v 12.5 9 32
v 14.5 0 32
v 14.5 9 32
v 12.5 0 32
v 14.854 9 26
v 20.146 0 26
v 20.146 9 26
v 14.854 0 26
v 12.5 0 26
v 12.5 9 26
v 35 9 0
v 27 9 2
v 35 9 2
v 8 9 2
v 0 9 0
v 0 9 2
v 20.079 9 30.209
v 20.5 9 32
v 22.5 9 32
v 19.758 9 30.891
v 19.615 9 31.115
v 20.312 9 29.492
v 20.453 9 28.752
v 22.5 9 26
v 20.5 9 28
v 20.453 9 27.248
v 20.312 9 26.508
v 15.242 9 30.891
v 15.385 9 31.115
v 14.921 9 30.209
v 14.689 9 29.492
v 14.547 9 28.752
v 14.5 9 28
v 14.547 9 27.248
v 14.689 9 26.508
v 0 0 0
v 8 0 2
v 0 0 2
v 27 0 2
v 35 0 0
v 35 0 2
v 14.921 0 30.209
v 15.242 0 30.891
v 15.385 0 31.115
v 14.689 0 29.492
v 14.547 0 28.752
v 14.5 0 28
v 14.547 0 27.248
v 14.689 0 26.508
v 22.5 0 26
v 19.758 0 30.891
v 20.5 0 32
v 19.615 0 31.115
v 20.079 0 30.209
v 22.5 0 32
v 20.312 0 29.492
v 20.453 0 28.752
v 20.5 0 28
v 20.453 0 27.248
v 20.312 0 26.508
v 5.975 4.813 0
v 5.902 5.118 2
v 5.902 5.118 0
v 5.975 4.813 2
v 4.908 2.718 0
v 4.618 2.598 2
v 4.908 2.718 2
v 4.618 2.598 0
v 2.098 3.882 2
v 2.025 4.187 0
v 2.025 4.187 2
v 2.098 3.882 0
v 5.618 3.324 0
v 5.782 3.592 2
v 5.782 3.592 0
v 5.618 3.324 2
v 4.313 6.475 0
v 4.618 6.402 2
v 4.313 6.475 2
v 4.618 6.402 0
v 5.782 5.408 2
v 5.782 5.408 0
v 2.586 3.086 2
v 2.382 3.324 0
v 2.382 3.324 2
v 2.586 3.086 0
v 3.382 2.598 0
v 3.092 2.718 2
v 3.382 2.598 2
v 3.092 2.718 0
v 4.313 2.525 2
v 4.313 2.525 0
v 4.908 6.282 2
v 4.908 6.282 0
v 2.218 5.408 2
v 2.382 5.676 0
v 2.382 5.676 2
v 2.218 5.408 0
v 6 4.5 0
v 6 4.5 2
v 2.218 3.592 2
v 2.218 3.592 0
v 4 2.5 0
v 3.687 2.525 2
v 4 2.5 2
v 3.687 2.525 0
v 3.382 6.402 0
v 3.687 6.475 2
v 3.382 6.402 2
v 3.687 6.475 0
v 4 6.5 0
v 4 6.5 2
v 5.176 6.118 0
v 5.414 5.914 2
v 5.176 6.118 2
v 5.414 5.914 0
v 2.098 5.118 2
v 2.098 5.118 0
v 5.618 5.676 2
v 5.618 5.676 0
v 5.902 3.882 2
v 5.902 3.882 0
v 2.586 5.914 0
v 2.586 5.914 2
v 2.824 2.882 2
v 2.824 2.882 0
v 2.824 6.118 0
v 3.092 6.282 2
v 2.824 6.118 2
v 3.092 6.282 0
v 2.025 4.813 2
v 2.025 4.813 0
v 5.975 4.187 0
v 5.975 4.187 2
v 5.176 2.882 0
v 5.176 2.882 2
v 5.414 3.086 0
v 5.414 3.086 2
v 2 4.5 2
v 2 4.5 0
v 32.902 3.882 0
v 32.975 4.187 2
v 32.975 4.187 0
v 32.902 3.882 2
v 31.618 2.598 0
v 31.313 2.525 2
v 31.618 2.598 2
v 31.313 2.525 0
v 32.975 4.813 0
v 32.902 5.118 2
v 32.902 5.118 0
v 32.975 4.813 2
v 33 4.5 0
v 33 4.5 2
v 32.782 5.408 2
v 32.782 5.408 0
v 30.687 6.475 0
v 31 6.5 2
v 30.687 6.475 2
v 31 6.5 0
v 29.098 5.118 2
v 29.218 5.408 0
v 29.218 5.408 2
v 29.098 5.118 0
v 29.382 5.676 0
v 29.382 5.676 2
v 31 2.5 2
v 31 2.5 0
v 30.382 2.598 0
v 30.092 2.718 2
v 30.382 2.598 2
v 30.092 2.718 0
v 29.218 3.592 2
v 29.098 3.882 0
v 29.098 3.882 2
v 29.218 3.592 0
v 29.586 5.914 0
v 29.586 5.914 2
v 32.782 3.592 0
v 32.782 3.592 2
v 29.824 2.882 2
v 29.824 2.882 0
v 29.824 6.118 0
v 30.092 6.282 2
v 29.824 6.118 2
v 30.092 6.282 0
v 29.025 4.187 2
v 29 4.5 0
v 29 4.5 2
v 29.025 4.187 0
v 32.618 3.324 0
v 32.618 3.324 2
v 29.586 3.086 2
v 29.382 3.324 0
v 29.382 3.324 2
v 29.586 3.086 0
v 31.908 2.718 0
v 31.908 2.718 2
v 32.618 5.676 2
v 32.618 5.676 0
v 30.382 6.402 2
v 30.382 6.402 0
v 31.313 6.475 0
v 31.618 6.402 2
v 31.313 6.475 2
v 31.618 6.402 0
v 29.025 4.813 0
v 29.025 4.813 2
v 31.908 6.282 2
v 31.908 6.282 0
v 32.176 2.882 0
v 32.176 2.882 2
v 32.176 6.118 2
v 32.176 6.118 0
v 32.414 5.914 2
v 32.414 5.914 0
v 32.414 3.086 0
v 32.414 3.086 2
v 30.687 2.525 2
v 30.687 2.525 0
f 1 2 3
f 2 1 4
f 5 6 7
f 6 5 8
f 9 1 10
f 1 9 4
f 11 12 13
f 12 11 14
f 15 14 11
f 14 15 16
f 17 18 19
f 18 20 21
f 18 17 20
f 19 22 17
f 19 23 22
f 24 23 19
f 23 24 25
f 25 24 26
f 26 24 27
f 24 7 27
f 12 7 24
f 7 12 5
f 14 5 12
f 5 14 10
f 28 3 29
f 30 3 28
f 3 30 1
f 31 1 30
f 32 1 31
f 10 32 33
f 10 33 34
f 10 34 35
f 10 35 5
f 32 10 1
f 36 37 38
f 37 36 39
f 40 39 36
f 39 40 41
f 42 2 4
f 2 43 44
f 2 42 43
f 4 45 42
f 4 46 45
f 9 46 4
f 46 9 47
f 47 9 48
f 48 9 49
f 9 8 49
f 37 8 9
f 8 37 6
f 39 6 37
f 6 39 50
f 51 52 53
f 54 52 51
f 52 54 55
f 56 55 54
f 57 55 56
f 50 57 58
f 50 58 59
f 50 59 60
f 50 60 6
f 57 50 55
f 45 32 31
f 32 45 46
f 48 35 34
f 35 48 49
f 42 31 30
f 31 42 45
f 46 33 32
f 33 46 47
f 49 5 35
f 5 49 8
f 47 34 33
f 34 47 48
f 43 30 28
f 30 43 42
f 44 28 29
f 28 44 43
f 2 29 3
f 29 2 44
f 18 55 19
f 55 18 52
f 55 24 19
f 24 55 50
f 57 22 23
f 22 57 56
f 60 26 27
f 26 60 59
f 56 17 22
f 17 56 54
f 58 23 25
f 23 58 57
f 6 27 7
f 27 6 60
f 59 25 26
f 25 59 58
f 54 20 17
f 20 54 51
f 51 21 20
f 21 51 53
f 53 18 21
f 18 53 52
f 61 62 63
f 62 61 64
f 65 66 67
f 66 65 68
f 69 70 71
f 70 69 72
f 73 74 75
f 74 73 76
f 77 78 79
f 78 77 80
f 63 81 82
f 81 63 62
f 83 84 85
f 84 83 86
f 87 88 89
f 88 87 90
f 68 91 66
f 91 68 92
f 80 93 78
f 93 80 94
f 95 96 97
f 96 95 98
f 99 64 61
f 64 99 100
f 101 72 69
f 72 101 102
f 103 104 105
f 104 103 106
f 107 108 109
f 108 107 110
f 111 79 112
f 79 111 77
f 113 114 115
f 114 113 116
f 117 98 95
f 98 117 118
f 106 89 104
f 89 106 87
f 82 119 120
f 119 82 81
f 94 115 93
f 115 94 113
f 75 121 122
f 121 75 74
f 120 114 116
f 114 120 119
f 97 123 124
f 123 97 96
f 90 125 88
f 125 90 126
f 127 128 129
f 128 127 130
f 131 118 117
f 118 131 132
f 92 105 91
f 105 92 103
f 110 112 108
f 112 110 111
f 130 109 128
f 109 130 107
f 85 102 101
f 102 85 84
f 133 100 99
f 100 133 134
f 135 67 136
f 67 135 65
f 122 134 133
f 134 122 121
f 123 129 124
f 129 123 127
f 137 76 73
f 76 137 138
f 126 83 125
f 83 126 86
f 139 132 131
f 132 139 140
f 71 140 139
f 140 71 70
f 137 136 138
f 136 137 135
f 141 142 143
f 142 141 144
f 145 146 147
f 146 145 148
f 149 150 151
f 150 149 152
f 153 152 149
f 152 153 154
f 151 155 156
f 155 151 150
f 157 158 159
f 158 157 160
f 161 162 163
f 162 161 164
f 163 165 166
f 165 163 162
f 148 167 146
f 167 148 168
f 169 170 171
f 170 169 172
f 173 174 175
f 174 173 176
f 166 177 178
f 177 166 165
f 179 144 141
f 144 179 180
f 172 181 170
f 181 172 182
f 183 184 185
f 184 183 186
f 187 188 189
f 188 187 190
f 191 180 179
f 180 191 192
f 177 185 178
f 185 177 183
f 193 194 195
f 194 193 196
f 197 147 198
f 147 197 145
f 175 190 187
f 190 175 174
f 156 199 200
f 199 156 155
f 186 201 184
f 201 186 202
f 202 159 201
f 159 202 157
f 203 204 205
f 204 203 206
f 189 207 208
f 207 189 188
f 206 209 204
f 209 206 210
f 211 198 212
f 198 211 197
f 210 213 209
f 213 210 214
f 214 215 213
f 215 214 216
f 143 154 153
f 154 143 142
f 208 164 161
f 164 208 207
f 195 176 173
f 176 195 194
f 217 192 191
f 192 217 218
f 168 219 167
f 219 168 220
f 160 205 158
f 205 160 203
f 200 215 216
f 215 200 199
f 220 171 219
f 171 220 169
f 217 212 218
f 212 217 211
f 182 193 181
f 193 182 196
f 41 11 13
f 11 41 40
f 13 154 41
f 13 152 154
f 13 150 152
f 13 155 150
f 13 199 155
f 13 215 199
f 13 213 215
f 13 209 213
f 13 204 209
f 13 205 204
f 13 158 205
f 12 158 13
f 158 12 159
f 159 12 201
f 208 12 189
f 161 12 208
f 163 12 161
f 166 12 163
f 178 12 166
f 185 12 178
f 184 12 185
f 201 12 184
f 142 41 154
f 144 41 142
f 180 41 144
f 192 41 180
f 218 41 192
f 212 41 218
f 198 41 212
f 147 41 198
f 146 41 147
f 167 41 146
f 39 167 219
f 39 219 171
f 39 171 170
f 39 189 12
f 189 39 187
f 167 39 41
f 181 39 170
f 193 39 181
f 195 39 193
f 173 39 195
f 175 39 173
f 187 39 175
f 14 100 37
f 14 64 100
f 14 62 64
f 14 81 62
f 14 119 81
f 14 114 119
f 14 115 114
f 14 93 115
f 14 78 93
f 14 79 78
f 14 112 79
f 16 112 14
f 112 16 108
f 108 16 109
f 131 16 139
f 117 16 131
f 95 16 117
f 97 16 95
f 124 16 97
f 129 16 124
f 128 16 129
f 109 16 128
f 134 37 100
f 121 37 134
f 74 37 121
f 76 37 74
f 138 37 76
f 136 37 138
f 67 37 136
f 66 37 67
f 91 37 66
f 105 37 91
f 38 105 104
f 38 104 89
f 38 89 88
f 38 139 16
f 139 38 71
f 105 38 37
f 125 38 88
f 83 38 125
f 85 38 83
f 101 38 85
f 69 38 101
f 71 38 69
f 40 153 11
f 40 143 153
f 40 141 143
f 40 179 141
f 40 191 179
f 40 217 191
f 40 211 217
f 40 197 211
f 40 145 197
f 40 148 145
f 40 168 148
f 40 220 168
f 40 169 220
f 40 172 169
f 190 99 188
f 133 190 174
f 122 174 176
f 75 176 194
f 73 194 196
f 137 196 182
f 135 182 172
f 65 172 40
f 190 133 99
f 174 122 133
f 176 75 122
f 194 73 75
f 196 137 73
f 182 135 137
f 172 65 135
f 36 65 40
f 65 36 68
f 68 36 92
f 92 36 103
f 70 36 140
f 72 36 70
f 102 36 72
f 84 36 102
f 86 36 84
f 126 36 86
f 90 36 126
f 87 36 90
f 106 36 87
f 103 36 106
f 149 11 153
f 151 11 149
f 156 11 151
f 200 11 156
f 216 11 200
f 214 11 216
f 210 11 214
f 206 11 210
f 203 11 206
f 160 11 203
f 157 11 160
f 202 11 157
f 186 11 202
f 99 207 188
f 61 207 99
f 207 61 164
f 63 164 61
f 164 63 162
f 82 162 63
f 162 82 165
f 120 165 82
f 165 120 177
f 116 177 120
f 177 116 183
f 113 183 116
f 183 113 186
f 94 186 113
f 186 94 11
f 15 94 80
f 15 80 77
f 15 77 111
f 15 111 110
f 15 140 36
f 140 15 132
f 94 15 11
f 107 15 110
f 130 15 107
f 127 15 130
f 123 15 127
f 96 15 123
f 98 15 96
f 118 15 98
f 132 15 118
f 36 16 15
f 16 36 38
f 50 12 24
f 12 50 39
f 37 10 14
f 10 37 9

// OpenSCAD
br = 9 ;      // breedte van de basis ;
le = 35 ;      // lengte van de basis ;
di =  2 ;      // dikte van de basis ; 
ho = 24 ;      // hoogte van de driehoek ;
vijspl = 8 ;   // plat stukje voor vijs ;
vijs_gat= 2 ;  // diameter voor vijs ; 
boven = 10 ;   // bovenkant van driehoek ; 
wand= 1.5 ;     // wand van de driehoek ;
blok_h=6 ;      // hoogte van blokje dat er bovenop staat ;
blok_le=9 ;     // lengte van blokje bovenop ;
blok_gat=4.5 ;  // diameter van gat in blokje bovenop;

blok_wand= 3;  // wanddikte rechtopstaande stuk waar ijzerke in moet komen;
blok_rond= 12 ; // diameter van opening waar ijzerke in moet passen, ijzerke zelf is 4.5 mm;

/*
// V1 instellingen

br = 10 ;      // breedte van de basis ;
le = 42 ;      // lengte van de basis ;
di =  3 ; 
ho = 23 ;      // hoogte van de driehoek ;
vijspl = 9 ;   // plat stukje voor vijs ;
vijs_gat= 2 ;  // diameter voor vijs ; 
boven = 10 ;   // bovenkant van driehoek ; 
wand= 1.5 ;     // wand van de driehoek ;
blok_h=6 ;      // hoogte van blokje dat er bovenop staat ;
blok_le=9 ;     // lengte van blokje bovenop ;
blok_gat=4.5 ;  // diameter van gat in blokje bovenop;

blok_wand= 3;  // wanddikte rechtopstaande stuk waar ijzerke in moet komen;
blok_rond= 12 ; // diameter van opening waar ijzerke in moet passen, ijzerke zelf is 4.5 mm;

*/ 



module blokje()
{
difference () {
cube ([blok_wand,br,blok_h ]) ;
translate ([blok_rond/2+blok_wand-1,br*3/2,blok_h/3]) rotate ([90,0,0]) cylinder (h= 2*br, r=blok_rond/2, $fn=50) ;
 translate ([blok_wand-1,-br*2/3,blok_h])  rotate ([0,45,0]) cube ([blok_wand,br*2,di]) ;
}

}

translate ([le/2- (boven)/2,0,ho+di]) {
translate ([boven,br,0]) rotate  ([ 0,0,180]) blokje();
blokje();
}

/*
// probeersel voor top ;
difference () {
cube ([blok_le,br,blok_h]) ;
translate ([blok_le/2,br*3/2,blok_h*2/3]) rotate ([90,0,0]) cylinder (h=2*br,r=blok_gat/2,$fn=50);
}
*/

// bodemplaatje met 2 gaten voor vijsjes ;
difference () { 
 cube ([le,br, di ]) ;
color ("navajowhite") {
     translate ([vijspl/2,br/2,-di/2]) cylinder (h=2*di,r=vijs_gat,$fn=40) ;
     translate ([le-vijspl/2,br/2,-di/2]) cylinder (h=2*di,r=vijs_gat,$fn=40) ;

  }
 }
 
translate ([0,0,di]){ 
/*difference () { */
polyhedron(
  points=[ [le-vijspl,br,0],        [vijspl,br,0],         [vijspl,0,0],          [le-vijspl,0,0],  // the four points at base
           [le/2+boven/2, br, ho], [le/2-boven/2, br, ho], [le/2-boven/2, 0, ho], [le/2+boven/2, 0, ho]  ],                                 // the apex point 
  faces=[ [0,4,5,1],[3,2,6,7], // links en rechts
          [2,1,5,6], [0,3,7,4] , // voor en achter
       [0,1,2,3],[4,7,6,5] ]  // bodem en bovenkant
  );
 
polyhedron(
  points=[ [le-vijspl-wand,br-wand,wand], [vijspl+wand,br-wand,wand], [vijspl+wand,wand,wand],          [le-vijspl-wand,wand,wand],  // the four points at base
           [le/2+boven/2-wand, br-wand, ho-wand], [le/2-boven/2+wand, br-wand, ho-wand], [le/2-boven/2+wand, wand, ho-wand], [le/2+boven/2-wand, wand, ho-wand]  ],                                 // the apex point 
  faces=[ [0,4,5,1],[3,2,6,7], // links en rechts
          [2,1,5,6], [0,3,7,4] , // voor en achter
       [0,1,2,3],[4,7,6,5] ]  // bodem en bovenkant
  );

/*
translate ([22,12,12]){
 rotate ([90,0,0]){   
 cylinder (h=15,r1=4,r2=4) ;
 } 
 }
     
 } */ 
}


 
    
